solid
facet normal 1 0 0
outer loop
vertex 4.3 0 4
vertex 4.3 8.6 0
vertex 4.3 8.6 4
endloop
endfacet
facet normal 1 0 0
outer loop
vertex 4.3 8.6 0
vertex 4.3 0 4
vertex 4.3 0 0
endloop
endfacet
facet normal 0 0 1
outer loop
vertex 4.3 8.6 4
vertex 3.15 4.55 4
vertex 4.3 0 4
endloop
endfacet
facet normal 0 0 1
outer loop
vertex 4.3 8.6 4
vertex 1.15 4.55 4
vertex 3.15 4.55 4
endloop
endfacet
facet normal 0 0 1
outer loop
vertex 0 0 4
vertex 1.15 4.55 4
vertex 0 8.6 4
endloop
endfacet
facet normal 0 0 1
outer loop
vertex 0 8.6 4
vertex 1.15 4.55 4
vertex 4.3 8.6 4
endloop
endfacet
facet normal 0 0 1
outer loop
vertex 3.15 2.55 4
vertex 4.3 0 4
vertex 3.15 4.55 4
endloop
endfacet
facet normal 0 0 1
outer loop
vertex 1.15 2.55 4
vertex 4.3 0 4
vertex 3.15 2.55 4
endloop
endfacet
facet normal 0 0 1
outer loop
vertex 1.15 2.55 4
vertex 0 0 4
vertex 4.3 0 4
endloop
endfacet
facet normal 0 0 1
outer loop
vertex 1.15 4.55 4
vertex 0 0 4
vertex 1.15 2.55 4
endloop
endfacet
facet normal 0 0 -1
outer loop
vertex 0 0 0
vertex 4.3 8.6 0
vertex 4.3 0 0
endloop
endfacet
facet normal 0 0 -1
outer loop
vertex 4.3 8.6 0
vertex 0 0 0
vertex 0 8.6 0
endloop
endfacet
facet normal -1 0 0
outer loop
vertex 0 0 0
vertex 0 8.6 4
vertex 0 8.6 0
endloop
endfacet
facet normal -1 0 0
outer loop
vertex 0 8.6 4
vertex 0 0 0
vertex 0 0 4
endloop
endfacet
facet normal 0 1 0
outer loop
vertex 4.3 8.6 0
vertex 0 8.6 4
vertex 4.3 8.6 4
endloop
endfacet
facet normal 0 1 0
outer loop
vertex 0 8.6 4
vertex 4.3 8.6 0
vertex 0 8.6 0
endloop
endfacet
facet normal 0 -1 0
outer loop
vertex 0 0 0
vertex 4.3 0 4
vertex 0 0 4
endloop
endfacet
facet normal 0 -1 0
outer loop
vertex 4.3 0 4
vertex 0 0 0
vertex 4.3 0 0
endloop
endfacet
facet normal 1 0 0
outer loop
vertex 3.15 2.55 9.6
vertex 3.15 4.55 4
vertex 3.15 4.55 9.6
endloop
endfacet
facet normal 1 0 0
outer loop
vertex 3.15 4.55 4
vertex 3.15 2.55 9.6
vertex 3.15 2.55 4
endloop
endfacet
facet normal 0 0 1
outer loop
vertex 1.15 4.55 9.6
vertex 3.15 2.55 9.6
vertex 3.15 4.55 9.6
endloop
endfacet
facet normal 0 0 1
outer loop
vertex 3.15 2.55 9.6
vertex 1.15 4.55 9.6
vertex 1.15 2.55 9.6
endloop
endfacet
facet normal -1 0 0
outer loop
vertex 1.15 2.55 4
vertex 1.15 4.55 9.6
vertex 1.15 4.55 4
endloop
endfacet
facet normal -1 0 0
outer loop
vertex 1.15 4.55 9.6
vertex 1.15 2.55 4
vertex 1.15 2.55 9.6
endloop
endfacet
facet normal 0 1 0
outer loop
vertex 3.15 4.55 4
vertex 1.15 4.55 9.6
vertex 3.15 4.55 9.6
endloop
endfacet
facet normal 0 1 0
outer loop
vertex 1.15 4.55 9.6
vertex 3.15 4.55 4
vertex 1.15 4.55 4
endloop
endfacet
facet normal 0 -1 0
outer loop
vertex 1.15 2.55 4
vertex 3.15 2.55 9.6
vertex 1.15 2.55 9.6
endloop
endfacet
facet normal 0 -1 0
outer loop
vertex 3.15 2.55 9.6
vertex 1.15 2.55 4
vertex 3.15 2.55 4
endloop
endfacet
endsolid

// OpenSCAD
// file: values.scad
DEFAULT_ROUNDING = 24;
HIDEF_ROUNDING = 120;

SACRIFICIAL_BRIDGE_HEIGHT = .2;
BREAKAWAY_SUPPORT_DEPTH = .2;

PCB_WIDTH = 181.356;
PCB_LENGTH = 127.254;
PCB_HEIGHT = 1.6;
PCB_MOUNT_HOLE_DIAMETER = 3.2;

PCB_BATTERY_CAVITY_X = 147.828;
PCB_BATTERY_CAVITY_Y = PCB_LENGTH - 94.234;
PCB_BATTERY_CAVITY_LENGTH = 66.8;

PCB_COMPONENTS_X = 2.126;
PCB_COMPONENTS_Y = 38.1;
PCB_COMPONENTS_WIDTH = PCB_WIDTH - PCB_COMPONENTS_X * 2;
PCB_COMPONENTS_LENGTH = PCB_LENGTH - PCB_COMPONENTS_Y - 1.78;
PCB_COMPONENTS_HEIGHT = 12;

BUTTON_DIAMETER = 6;
BUTTON_LENGTH = 6.6;
BUTTON_WIDTH = 4.5;
BUTTON_HEIGHT = 6;

PCB_HOLES = [
    [6.64, PCB_LENGTH - 122.682],
    [62.52, PCB_LENGTH - 122.682],
    [118.4, PCB_LENGTH - 122.682],
    [174.28, PCB_LENGTH - 122.682],

    [6.64, PCB_LENGTH - 97.79],
    [62.52, PCB_LENGTH - 97.79],
    [118.4, PCB_LENGTH - 97.79],
    [174.28, PCB_LENGTH - 97.79],

    [3.302, PCB_LENGTH - 22.098],
    [178.054, PCB_LENGTH - 3.302],
];

PCB_BUTTONS = [
    [8.89, PCB_LENGTH - BUTTON_LENGTH - 111.506],
    [16.51, PCB_LENGTH - BUTTON_LENGTH - 106.426],
    [24.13, PCB_LENGTH - BUTTON_LENGTH - 111.506],
    [31.75, PCB_LENGTH - BUTTON_LENGTH - 106.426],
    [39.37, PCB_LENGTH - BUTTON_LENGTH - 111.506],
    [46.99, PCB_LENGTH - BUTTON_LENGTH - 106.426],
    [54.61, PCB_LENGTH - BUTTON_LENGTH - 111.506],
    [69.85, PCB_LENGTH - BUTTON_LENGTH - 111.506],
    [77.47, PCB_LENGTH - BUTTON_LENGTH - 106.426],
    [85.09, PCB_LENGTH - BUTTON_LENGTH - 111.506],
    [92.71, PCB_LENGTH - BUTTON_LENGTH - 106.426],
    [100.33, PCB_LENGTH - BUTTON_LENGTH - 111.506],
    [115.57, PCB_LENGTH - BUTTON_LENGTH - 111.506],
    [123.19, PCB_LENGTH - BUTTON_LENGTH - 106.426],
    [130.81, PCB_LENGTH - BUTTON_LENGTH - 111.506],
    [138.43, PCB_LENGTH - BUTTON_LENGTH - 106.426],
    [146.05, PCB_LENGTH - BUTTON_LENGTH - 111.506],
    [153.67, PCB_LENGTH - BUTTON_LENGTH - 106.426],
    [161.29, PCB_LENGTH - BUTTON_LENGTH - 111.506],
    [176.53, PCB_LENGTH - BUTTON_LENGTH - 111.506],
];

PCB_VOLUME_WHEEL_X = 177.271969;
PCB_VOLUME_WHEEL_Y = PCB_LENGTH - 20.828;

SCREW_HEAD_DIAMETER = 6;
SCREW_HEAD_HEIGHT = 2.2;
NUT_DIAMETER = 6.4;
NUT_HEIGHT = 2.6;

MOUNT_STILT_MINIMUM_HEIGHT = NUT_HEIGHT + .5 + 2; // TODO: tidy against mount_stilt args

NATURAL_KEY_SEQUENCES = [
    [1,0,1,0,1,1,0,1,0,1,0,1,],
    [0,1,0,1,1,0,1,0,1,0,1,1,],
    [1,0,1,1,0,1,0,1,0,1,1,0,],
    [0,1,1,0,1,0,1,0,1,1,0,1,],
    [1,1,0,1,0,1,0,1,1,0,1,0,],
    [1,0,1,0,1,0,1,1,0,1,0,1,],
    [0,1,0,1,0,1,1,0,1,0,1,1,],
    [1,0,1,0,1,1,0,1,0,1,1,0,],
    [0,1,0,1,1,0,1,0,1,1,0,1,],
    [1,0,1,1,0,1,0,1,1,0,1,0,],
    [0,1,1,0,1,0,1,1,0,1,0,1,],
    [1,1,0,1,0,1,1,0,1,0,1,0,],
];

HINGE_CLASP_DEFAULT_PIN_DIAMETER = 1.75; // filament diameter
HINGE_CLASP_DEFAULT_MINIMAL_SUPPORT = 1.5;
HINGE_CLASP_MINIMUM_TOOTH_WIDTH = 5;
HINGE_CLASP_MINIMUM_TOOTH_COUNT = 5;
HINGE_CLASP_MINIMUM_WIDTH = HINGE_CLASP_MINIMUM_TOOTH_WIDTH
    * HINGE_CLASP_MINIMUM_TOOTH_COUNT;
MINIMUM_HINGE_CLASP_LENGTH = 20;

HINGE_CLASP_SIDE_FRONT_BACK = 0;
HINGE_CLASP_SIDE_LEFT_RIGHT = 1;

LIP_BOX_DEFAULT_LIP_HEIGHT = 3;

BATTERY_WIDTH = 27.5;
BATTERY_LENGTH = 51;
BATTERY_HEIGHT = 16.5;
BATTERY_SNAP_LENGTH = 5;

/* AZ40R https://www.jameco.com/Jameco/Products/ProdDS/2227516.pdf */
SPEAKER_DIAMETER = 40;
SPEAKER_HEIGHT = 5;
SPEAKER_CLEARANCE = 2;

/* https://www.ckswitches.com/media/1428/os.pdf */
SWITCH_BASE_WIDTH = 4.3;
SWITCH_BASE_LENGTH = 8.6;
SWITCH_BASE_HEIGHT = 4;
SWITCH_ACTUATOR_WIDTH = 2; // TODO: confirm IRL
SWITCH_ACTUATOR_LENGTH = 2;
SWITCH_ACTUATOR_HEIGHT = 5.6;
SWITCH_ACTUATOR_TRAVEL = 1.5;
SWITCH_ORIGIN = [0, 0];

PENCIL_STAND_CAVITY_DIAMETER = 8.5;

WINDOW_PANE_HEIGHT = 25.4 * 1 / 8;
// main file
include <values.scad>;

module switch(position = 0) {
    translate([-SWITCH_ORIGIN.x, -SWITCH_ORIGIN.y, 0]) {
        cube([
            SWITCH_BASE_WIDTH,
            SWITCH_BASE_LENGTH,
            SWITCH_BASE_HEIGHT
        ]);

        translate([
            (SWITCH_BASE_WIDTH - SWITCH_ACTUATOR_WIDTH) / 2,
            (SWITCH_BASE_LENGTH - SWITCH_ACTUATOR_LENGTH) / 2
                - SWITCH_ACTUATOR_TRAVEL / 2
                + SWITCH_ACTUATOR_TRAVEL * position,
            SWITCH_BASE_HEIGHT
        ]) {
            cube([
                SWITCH_ACTUATOR_WIDTH,
                SWITCH_ACTUATOR_LENGTH,
                SWITCH_ACTUATOR_HEIGHT
            ]);
        }
    }
}

switch();
